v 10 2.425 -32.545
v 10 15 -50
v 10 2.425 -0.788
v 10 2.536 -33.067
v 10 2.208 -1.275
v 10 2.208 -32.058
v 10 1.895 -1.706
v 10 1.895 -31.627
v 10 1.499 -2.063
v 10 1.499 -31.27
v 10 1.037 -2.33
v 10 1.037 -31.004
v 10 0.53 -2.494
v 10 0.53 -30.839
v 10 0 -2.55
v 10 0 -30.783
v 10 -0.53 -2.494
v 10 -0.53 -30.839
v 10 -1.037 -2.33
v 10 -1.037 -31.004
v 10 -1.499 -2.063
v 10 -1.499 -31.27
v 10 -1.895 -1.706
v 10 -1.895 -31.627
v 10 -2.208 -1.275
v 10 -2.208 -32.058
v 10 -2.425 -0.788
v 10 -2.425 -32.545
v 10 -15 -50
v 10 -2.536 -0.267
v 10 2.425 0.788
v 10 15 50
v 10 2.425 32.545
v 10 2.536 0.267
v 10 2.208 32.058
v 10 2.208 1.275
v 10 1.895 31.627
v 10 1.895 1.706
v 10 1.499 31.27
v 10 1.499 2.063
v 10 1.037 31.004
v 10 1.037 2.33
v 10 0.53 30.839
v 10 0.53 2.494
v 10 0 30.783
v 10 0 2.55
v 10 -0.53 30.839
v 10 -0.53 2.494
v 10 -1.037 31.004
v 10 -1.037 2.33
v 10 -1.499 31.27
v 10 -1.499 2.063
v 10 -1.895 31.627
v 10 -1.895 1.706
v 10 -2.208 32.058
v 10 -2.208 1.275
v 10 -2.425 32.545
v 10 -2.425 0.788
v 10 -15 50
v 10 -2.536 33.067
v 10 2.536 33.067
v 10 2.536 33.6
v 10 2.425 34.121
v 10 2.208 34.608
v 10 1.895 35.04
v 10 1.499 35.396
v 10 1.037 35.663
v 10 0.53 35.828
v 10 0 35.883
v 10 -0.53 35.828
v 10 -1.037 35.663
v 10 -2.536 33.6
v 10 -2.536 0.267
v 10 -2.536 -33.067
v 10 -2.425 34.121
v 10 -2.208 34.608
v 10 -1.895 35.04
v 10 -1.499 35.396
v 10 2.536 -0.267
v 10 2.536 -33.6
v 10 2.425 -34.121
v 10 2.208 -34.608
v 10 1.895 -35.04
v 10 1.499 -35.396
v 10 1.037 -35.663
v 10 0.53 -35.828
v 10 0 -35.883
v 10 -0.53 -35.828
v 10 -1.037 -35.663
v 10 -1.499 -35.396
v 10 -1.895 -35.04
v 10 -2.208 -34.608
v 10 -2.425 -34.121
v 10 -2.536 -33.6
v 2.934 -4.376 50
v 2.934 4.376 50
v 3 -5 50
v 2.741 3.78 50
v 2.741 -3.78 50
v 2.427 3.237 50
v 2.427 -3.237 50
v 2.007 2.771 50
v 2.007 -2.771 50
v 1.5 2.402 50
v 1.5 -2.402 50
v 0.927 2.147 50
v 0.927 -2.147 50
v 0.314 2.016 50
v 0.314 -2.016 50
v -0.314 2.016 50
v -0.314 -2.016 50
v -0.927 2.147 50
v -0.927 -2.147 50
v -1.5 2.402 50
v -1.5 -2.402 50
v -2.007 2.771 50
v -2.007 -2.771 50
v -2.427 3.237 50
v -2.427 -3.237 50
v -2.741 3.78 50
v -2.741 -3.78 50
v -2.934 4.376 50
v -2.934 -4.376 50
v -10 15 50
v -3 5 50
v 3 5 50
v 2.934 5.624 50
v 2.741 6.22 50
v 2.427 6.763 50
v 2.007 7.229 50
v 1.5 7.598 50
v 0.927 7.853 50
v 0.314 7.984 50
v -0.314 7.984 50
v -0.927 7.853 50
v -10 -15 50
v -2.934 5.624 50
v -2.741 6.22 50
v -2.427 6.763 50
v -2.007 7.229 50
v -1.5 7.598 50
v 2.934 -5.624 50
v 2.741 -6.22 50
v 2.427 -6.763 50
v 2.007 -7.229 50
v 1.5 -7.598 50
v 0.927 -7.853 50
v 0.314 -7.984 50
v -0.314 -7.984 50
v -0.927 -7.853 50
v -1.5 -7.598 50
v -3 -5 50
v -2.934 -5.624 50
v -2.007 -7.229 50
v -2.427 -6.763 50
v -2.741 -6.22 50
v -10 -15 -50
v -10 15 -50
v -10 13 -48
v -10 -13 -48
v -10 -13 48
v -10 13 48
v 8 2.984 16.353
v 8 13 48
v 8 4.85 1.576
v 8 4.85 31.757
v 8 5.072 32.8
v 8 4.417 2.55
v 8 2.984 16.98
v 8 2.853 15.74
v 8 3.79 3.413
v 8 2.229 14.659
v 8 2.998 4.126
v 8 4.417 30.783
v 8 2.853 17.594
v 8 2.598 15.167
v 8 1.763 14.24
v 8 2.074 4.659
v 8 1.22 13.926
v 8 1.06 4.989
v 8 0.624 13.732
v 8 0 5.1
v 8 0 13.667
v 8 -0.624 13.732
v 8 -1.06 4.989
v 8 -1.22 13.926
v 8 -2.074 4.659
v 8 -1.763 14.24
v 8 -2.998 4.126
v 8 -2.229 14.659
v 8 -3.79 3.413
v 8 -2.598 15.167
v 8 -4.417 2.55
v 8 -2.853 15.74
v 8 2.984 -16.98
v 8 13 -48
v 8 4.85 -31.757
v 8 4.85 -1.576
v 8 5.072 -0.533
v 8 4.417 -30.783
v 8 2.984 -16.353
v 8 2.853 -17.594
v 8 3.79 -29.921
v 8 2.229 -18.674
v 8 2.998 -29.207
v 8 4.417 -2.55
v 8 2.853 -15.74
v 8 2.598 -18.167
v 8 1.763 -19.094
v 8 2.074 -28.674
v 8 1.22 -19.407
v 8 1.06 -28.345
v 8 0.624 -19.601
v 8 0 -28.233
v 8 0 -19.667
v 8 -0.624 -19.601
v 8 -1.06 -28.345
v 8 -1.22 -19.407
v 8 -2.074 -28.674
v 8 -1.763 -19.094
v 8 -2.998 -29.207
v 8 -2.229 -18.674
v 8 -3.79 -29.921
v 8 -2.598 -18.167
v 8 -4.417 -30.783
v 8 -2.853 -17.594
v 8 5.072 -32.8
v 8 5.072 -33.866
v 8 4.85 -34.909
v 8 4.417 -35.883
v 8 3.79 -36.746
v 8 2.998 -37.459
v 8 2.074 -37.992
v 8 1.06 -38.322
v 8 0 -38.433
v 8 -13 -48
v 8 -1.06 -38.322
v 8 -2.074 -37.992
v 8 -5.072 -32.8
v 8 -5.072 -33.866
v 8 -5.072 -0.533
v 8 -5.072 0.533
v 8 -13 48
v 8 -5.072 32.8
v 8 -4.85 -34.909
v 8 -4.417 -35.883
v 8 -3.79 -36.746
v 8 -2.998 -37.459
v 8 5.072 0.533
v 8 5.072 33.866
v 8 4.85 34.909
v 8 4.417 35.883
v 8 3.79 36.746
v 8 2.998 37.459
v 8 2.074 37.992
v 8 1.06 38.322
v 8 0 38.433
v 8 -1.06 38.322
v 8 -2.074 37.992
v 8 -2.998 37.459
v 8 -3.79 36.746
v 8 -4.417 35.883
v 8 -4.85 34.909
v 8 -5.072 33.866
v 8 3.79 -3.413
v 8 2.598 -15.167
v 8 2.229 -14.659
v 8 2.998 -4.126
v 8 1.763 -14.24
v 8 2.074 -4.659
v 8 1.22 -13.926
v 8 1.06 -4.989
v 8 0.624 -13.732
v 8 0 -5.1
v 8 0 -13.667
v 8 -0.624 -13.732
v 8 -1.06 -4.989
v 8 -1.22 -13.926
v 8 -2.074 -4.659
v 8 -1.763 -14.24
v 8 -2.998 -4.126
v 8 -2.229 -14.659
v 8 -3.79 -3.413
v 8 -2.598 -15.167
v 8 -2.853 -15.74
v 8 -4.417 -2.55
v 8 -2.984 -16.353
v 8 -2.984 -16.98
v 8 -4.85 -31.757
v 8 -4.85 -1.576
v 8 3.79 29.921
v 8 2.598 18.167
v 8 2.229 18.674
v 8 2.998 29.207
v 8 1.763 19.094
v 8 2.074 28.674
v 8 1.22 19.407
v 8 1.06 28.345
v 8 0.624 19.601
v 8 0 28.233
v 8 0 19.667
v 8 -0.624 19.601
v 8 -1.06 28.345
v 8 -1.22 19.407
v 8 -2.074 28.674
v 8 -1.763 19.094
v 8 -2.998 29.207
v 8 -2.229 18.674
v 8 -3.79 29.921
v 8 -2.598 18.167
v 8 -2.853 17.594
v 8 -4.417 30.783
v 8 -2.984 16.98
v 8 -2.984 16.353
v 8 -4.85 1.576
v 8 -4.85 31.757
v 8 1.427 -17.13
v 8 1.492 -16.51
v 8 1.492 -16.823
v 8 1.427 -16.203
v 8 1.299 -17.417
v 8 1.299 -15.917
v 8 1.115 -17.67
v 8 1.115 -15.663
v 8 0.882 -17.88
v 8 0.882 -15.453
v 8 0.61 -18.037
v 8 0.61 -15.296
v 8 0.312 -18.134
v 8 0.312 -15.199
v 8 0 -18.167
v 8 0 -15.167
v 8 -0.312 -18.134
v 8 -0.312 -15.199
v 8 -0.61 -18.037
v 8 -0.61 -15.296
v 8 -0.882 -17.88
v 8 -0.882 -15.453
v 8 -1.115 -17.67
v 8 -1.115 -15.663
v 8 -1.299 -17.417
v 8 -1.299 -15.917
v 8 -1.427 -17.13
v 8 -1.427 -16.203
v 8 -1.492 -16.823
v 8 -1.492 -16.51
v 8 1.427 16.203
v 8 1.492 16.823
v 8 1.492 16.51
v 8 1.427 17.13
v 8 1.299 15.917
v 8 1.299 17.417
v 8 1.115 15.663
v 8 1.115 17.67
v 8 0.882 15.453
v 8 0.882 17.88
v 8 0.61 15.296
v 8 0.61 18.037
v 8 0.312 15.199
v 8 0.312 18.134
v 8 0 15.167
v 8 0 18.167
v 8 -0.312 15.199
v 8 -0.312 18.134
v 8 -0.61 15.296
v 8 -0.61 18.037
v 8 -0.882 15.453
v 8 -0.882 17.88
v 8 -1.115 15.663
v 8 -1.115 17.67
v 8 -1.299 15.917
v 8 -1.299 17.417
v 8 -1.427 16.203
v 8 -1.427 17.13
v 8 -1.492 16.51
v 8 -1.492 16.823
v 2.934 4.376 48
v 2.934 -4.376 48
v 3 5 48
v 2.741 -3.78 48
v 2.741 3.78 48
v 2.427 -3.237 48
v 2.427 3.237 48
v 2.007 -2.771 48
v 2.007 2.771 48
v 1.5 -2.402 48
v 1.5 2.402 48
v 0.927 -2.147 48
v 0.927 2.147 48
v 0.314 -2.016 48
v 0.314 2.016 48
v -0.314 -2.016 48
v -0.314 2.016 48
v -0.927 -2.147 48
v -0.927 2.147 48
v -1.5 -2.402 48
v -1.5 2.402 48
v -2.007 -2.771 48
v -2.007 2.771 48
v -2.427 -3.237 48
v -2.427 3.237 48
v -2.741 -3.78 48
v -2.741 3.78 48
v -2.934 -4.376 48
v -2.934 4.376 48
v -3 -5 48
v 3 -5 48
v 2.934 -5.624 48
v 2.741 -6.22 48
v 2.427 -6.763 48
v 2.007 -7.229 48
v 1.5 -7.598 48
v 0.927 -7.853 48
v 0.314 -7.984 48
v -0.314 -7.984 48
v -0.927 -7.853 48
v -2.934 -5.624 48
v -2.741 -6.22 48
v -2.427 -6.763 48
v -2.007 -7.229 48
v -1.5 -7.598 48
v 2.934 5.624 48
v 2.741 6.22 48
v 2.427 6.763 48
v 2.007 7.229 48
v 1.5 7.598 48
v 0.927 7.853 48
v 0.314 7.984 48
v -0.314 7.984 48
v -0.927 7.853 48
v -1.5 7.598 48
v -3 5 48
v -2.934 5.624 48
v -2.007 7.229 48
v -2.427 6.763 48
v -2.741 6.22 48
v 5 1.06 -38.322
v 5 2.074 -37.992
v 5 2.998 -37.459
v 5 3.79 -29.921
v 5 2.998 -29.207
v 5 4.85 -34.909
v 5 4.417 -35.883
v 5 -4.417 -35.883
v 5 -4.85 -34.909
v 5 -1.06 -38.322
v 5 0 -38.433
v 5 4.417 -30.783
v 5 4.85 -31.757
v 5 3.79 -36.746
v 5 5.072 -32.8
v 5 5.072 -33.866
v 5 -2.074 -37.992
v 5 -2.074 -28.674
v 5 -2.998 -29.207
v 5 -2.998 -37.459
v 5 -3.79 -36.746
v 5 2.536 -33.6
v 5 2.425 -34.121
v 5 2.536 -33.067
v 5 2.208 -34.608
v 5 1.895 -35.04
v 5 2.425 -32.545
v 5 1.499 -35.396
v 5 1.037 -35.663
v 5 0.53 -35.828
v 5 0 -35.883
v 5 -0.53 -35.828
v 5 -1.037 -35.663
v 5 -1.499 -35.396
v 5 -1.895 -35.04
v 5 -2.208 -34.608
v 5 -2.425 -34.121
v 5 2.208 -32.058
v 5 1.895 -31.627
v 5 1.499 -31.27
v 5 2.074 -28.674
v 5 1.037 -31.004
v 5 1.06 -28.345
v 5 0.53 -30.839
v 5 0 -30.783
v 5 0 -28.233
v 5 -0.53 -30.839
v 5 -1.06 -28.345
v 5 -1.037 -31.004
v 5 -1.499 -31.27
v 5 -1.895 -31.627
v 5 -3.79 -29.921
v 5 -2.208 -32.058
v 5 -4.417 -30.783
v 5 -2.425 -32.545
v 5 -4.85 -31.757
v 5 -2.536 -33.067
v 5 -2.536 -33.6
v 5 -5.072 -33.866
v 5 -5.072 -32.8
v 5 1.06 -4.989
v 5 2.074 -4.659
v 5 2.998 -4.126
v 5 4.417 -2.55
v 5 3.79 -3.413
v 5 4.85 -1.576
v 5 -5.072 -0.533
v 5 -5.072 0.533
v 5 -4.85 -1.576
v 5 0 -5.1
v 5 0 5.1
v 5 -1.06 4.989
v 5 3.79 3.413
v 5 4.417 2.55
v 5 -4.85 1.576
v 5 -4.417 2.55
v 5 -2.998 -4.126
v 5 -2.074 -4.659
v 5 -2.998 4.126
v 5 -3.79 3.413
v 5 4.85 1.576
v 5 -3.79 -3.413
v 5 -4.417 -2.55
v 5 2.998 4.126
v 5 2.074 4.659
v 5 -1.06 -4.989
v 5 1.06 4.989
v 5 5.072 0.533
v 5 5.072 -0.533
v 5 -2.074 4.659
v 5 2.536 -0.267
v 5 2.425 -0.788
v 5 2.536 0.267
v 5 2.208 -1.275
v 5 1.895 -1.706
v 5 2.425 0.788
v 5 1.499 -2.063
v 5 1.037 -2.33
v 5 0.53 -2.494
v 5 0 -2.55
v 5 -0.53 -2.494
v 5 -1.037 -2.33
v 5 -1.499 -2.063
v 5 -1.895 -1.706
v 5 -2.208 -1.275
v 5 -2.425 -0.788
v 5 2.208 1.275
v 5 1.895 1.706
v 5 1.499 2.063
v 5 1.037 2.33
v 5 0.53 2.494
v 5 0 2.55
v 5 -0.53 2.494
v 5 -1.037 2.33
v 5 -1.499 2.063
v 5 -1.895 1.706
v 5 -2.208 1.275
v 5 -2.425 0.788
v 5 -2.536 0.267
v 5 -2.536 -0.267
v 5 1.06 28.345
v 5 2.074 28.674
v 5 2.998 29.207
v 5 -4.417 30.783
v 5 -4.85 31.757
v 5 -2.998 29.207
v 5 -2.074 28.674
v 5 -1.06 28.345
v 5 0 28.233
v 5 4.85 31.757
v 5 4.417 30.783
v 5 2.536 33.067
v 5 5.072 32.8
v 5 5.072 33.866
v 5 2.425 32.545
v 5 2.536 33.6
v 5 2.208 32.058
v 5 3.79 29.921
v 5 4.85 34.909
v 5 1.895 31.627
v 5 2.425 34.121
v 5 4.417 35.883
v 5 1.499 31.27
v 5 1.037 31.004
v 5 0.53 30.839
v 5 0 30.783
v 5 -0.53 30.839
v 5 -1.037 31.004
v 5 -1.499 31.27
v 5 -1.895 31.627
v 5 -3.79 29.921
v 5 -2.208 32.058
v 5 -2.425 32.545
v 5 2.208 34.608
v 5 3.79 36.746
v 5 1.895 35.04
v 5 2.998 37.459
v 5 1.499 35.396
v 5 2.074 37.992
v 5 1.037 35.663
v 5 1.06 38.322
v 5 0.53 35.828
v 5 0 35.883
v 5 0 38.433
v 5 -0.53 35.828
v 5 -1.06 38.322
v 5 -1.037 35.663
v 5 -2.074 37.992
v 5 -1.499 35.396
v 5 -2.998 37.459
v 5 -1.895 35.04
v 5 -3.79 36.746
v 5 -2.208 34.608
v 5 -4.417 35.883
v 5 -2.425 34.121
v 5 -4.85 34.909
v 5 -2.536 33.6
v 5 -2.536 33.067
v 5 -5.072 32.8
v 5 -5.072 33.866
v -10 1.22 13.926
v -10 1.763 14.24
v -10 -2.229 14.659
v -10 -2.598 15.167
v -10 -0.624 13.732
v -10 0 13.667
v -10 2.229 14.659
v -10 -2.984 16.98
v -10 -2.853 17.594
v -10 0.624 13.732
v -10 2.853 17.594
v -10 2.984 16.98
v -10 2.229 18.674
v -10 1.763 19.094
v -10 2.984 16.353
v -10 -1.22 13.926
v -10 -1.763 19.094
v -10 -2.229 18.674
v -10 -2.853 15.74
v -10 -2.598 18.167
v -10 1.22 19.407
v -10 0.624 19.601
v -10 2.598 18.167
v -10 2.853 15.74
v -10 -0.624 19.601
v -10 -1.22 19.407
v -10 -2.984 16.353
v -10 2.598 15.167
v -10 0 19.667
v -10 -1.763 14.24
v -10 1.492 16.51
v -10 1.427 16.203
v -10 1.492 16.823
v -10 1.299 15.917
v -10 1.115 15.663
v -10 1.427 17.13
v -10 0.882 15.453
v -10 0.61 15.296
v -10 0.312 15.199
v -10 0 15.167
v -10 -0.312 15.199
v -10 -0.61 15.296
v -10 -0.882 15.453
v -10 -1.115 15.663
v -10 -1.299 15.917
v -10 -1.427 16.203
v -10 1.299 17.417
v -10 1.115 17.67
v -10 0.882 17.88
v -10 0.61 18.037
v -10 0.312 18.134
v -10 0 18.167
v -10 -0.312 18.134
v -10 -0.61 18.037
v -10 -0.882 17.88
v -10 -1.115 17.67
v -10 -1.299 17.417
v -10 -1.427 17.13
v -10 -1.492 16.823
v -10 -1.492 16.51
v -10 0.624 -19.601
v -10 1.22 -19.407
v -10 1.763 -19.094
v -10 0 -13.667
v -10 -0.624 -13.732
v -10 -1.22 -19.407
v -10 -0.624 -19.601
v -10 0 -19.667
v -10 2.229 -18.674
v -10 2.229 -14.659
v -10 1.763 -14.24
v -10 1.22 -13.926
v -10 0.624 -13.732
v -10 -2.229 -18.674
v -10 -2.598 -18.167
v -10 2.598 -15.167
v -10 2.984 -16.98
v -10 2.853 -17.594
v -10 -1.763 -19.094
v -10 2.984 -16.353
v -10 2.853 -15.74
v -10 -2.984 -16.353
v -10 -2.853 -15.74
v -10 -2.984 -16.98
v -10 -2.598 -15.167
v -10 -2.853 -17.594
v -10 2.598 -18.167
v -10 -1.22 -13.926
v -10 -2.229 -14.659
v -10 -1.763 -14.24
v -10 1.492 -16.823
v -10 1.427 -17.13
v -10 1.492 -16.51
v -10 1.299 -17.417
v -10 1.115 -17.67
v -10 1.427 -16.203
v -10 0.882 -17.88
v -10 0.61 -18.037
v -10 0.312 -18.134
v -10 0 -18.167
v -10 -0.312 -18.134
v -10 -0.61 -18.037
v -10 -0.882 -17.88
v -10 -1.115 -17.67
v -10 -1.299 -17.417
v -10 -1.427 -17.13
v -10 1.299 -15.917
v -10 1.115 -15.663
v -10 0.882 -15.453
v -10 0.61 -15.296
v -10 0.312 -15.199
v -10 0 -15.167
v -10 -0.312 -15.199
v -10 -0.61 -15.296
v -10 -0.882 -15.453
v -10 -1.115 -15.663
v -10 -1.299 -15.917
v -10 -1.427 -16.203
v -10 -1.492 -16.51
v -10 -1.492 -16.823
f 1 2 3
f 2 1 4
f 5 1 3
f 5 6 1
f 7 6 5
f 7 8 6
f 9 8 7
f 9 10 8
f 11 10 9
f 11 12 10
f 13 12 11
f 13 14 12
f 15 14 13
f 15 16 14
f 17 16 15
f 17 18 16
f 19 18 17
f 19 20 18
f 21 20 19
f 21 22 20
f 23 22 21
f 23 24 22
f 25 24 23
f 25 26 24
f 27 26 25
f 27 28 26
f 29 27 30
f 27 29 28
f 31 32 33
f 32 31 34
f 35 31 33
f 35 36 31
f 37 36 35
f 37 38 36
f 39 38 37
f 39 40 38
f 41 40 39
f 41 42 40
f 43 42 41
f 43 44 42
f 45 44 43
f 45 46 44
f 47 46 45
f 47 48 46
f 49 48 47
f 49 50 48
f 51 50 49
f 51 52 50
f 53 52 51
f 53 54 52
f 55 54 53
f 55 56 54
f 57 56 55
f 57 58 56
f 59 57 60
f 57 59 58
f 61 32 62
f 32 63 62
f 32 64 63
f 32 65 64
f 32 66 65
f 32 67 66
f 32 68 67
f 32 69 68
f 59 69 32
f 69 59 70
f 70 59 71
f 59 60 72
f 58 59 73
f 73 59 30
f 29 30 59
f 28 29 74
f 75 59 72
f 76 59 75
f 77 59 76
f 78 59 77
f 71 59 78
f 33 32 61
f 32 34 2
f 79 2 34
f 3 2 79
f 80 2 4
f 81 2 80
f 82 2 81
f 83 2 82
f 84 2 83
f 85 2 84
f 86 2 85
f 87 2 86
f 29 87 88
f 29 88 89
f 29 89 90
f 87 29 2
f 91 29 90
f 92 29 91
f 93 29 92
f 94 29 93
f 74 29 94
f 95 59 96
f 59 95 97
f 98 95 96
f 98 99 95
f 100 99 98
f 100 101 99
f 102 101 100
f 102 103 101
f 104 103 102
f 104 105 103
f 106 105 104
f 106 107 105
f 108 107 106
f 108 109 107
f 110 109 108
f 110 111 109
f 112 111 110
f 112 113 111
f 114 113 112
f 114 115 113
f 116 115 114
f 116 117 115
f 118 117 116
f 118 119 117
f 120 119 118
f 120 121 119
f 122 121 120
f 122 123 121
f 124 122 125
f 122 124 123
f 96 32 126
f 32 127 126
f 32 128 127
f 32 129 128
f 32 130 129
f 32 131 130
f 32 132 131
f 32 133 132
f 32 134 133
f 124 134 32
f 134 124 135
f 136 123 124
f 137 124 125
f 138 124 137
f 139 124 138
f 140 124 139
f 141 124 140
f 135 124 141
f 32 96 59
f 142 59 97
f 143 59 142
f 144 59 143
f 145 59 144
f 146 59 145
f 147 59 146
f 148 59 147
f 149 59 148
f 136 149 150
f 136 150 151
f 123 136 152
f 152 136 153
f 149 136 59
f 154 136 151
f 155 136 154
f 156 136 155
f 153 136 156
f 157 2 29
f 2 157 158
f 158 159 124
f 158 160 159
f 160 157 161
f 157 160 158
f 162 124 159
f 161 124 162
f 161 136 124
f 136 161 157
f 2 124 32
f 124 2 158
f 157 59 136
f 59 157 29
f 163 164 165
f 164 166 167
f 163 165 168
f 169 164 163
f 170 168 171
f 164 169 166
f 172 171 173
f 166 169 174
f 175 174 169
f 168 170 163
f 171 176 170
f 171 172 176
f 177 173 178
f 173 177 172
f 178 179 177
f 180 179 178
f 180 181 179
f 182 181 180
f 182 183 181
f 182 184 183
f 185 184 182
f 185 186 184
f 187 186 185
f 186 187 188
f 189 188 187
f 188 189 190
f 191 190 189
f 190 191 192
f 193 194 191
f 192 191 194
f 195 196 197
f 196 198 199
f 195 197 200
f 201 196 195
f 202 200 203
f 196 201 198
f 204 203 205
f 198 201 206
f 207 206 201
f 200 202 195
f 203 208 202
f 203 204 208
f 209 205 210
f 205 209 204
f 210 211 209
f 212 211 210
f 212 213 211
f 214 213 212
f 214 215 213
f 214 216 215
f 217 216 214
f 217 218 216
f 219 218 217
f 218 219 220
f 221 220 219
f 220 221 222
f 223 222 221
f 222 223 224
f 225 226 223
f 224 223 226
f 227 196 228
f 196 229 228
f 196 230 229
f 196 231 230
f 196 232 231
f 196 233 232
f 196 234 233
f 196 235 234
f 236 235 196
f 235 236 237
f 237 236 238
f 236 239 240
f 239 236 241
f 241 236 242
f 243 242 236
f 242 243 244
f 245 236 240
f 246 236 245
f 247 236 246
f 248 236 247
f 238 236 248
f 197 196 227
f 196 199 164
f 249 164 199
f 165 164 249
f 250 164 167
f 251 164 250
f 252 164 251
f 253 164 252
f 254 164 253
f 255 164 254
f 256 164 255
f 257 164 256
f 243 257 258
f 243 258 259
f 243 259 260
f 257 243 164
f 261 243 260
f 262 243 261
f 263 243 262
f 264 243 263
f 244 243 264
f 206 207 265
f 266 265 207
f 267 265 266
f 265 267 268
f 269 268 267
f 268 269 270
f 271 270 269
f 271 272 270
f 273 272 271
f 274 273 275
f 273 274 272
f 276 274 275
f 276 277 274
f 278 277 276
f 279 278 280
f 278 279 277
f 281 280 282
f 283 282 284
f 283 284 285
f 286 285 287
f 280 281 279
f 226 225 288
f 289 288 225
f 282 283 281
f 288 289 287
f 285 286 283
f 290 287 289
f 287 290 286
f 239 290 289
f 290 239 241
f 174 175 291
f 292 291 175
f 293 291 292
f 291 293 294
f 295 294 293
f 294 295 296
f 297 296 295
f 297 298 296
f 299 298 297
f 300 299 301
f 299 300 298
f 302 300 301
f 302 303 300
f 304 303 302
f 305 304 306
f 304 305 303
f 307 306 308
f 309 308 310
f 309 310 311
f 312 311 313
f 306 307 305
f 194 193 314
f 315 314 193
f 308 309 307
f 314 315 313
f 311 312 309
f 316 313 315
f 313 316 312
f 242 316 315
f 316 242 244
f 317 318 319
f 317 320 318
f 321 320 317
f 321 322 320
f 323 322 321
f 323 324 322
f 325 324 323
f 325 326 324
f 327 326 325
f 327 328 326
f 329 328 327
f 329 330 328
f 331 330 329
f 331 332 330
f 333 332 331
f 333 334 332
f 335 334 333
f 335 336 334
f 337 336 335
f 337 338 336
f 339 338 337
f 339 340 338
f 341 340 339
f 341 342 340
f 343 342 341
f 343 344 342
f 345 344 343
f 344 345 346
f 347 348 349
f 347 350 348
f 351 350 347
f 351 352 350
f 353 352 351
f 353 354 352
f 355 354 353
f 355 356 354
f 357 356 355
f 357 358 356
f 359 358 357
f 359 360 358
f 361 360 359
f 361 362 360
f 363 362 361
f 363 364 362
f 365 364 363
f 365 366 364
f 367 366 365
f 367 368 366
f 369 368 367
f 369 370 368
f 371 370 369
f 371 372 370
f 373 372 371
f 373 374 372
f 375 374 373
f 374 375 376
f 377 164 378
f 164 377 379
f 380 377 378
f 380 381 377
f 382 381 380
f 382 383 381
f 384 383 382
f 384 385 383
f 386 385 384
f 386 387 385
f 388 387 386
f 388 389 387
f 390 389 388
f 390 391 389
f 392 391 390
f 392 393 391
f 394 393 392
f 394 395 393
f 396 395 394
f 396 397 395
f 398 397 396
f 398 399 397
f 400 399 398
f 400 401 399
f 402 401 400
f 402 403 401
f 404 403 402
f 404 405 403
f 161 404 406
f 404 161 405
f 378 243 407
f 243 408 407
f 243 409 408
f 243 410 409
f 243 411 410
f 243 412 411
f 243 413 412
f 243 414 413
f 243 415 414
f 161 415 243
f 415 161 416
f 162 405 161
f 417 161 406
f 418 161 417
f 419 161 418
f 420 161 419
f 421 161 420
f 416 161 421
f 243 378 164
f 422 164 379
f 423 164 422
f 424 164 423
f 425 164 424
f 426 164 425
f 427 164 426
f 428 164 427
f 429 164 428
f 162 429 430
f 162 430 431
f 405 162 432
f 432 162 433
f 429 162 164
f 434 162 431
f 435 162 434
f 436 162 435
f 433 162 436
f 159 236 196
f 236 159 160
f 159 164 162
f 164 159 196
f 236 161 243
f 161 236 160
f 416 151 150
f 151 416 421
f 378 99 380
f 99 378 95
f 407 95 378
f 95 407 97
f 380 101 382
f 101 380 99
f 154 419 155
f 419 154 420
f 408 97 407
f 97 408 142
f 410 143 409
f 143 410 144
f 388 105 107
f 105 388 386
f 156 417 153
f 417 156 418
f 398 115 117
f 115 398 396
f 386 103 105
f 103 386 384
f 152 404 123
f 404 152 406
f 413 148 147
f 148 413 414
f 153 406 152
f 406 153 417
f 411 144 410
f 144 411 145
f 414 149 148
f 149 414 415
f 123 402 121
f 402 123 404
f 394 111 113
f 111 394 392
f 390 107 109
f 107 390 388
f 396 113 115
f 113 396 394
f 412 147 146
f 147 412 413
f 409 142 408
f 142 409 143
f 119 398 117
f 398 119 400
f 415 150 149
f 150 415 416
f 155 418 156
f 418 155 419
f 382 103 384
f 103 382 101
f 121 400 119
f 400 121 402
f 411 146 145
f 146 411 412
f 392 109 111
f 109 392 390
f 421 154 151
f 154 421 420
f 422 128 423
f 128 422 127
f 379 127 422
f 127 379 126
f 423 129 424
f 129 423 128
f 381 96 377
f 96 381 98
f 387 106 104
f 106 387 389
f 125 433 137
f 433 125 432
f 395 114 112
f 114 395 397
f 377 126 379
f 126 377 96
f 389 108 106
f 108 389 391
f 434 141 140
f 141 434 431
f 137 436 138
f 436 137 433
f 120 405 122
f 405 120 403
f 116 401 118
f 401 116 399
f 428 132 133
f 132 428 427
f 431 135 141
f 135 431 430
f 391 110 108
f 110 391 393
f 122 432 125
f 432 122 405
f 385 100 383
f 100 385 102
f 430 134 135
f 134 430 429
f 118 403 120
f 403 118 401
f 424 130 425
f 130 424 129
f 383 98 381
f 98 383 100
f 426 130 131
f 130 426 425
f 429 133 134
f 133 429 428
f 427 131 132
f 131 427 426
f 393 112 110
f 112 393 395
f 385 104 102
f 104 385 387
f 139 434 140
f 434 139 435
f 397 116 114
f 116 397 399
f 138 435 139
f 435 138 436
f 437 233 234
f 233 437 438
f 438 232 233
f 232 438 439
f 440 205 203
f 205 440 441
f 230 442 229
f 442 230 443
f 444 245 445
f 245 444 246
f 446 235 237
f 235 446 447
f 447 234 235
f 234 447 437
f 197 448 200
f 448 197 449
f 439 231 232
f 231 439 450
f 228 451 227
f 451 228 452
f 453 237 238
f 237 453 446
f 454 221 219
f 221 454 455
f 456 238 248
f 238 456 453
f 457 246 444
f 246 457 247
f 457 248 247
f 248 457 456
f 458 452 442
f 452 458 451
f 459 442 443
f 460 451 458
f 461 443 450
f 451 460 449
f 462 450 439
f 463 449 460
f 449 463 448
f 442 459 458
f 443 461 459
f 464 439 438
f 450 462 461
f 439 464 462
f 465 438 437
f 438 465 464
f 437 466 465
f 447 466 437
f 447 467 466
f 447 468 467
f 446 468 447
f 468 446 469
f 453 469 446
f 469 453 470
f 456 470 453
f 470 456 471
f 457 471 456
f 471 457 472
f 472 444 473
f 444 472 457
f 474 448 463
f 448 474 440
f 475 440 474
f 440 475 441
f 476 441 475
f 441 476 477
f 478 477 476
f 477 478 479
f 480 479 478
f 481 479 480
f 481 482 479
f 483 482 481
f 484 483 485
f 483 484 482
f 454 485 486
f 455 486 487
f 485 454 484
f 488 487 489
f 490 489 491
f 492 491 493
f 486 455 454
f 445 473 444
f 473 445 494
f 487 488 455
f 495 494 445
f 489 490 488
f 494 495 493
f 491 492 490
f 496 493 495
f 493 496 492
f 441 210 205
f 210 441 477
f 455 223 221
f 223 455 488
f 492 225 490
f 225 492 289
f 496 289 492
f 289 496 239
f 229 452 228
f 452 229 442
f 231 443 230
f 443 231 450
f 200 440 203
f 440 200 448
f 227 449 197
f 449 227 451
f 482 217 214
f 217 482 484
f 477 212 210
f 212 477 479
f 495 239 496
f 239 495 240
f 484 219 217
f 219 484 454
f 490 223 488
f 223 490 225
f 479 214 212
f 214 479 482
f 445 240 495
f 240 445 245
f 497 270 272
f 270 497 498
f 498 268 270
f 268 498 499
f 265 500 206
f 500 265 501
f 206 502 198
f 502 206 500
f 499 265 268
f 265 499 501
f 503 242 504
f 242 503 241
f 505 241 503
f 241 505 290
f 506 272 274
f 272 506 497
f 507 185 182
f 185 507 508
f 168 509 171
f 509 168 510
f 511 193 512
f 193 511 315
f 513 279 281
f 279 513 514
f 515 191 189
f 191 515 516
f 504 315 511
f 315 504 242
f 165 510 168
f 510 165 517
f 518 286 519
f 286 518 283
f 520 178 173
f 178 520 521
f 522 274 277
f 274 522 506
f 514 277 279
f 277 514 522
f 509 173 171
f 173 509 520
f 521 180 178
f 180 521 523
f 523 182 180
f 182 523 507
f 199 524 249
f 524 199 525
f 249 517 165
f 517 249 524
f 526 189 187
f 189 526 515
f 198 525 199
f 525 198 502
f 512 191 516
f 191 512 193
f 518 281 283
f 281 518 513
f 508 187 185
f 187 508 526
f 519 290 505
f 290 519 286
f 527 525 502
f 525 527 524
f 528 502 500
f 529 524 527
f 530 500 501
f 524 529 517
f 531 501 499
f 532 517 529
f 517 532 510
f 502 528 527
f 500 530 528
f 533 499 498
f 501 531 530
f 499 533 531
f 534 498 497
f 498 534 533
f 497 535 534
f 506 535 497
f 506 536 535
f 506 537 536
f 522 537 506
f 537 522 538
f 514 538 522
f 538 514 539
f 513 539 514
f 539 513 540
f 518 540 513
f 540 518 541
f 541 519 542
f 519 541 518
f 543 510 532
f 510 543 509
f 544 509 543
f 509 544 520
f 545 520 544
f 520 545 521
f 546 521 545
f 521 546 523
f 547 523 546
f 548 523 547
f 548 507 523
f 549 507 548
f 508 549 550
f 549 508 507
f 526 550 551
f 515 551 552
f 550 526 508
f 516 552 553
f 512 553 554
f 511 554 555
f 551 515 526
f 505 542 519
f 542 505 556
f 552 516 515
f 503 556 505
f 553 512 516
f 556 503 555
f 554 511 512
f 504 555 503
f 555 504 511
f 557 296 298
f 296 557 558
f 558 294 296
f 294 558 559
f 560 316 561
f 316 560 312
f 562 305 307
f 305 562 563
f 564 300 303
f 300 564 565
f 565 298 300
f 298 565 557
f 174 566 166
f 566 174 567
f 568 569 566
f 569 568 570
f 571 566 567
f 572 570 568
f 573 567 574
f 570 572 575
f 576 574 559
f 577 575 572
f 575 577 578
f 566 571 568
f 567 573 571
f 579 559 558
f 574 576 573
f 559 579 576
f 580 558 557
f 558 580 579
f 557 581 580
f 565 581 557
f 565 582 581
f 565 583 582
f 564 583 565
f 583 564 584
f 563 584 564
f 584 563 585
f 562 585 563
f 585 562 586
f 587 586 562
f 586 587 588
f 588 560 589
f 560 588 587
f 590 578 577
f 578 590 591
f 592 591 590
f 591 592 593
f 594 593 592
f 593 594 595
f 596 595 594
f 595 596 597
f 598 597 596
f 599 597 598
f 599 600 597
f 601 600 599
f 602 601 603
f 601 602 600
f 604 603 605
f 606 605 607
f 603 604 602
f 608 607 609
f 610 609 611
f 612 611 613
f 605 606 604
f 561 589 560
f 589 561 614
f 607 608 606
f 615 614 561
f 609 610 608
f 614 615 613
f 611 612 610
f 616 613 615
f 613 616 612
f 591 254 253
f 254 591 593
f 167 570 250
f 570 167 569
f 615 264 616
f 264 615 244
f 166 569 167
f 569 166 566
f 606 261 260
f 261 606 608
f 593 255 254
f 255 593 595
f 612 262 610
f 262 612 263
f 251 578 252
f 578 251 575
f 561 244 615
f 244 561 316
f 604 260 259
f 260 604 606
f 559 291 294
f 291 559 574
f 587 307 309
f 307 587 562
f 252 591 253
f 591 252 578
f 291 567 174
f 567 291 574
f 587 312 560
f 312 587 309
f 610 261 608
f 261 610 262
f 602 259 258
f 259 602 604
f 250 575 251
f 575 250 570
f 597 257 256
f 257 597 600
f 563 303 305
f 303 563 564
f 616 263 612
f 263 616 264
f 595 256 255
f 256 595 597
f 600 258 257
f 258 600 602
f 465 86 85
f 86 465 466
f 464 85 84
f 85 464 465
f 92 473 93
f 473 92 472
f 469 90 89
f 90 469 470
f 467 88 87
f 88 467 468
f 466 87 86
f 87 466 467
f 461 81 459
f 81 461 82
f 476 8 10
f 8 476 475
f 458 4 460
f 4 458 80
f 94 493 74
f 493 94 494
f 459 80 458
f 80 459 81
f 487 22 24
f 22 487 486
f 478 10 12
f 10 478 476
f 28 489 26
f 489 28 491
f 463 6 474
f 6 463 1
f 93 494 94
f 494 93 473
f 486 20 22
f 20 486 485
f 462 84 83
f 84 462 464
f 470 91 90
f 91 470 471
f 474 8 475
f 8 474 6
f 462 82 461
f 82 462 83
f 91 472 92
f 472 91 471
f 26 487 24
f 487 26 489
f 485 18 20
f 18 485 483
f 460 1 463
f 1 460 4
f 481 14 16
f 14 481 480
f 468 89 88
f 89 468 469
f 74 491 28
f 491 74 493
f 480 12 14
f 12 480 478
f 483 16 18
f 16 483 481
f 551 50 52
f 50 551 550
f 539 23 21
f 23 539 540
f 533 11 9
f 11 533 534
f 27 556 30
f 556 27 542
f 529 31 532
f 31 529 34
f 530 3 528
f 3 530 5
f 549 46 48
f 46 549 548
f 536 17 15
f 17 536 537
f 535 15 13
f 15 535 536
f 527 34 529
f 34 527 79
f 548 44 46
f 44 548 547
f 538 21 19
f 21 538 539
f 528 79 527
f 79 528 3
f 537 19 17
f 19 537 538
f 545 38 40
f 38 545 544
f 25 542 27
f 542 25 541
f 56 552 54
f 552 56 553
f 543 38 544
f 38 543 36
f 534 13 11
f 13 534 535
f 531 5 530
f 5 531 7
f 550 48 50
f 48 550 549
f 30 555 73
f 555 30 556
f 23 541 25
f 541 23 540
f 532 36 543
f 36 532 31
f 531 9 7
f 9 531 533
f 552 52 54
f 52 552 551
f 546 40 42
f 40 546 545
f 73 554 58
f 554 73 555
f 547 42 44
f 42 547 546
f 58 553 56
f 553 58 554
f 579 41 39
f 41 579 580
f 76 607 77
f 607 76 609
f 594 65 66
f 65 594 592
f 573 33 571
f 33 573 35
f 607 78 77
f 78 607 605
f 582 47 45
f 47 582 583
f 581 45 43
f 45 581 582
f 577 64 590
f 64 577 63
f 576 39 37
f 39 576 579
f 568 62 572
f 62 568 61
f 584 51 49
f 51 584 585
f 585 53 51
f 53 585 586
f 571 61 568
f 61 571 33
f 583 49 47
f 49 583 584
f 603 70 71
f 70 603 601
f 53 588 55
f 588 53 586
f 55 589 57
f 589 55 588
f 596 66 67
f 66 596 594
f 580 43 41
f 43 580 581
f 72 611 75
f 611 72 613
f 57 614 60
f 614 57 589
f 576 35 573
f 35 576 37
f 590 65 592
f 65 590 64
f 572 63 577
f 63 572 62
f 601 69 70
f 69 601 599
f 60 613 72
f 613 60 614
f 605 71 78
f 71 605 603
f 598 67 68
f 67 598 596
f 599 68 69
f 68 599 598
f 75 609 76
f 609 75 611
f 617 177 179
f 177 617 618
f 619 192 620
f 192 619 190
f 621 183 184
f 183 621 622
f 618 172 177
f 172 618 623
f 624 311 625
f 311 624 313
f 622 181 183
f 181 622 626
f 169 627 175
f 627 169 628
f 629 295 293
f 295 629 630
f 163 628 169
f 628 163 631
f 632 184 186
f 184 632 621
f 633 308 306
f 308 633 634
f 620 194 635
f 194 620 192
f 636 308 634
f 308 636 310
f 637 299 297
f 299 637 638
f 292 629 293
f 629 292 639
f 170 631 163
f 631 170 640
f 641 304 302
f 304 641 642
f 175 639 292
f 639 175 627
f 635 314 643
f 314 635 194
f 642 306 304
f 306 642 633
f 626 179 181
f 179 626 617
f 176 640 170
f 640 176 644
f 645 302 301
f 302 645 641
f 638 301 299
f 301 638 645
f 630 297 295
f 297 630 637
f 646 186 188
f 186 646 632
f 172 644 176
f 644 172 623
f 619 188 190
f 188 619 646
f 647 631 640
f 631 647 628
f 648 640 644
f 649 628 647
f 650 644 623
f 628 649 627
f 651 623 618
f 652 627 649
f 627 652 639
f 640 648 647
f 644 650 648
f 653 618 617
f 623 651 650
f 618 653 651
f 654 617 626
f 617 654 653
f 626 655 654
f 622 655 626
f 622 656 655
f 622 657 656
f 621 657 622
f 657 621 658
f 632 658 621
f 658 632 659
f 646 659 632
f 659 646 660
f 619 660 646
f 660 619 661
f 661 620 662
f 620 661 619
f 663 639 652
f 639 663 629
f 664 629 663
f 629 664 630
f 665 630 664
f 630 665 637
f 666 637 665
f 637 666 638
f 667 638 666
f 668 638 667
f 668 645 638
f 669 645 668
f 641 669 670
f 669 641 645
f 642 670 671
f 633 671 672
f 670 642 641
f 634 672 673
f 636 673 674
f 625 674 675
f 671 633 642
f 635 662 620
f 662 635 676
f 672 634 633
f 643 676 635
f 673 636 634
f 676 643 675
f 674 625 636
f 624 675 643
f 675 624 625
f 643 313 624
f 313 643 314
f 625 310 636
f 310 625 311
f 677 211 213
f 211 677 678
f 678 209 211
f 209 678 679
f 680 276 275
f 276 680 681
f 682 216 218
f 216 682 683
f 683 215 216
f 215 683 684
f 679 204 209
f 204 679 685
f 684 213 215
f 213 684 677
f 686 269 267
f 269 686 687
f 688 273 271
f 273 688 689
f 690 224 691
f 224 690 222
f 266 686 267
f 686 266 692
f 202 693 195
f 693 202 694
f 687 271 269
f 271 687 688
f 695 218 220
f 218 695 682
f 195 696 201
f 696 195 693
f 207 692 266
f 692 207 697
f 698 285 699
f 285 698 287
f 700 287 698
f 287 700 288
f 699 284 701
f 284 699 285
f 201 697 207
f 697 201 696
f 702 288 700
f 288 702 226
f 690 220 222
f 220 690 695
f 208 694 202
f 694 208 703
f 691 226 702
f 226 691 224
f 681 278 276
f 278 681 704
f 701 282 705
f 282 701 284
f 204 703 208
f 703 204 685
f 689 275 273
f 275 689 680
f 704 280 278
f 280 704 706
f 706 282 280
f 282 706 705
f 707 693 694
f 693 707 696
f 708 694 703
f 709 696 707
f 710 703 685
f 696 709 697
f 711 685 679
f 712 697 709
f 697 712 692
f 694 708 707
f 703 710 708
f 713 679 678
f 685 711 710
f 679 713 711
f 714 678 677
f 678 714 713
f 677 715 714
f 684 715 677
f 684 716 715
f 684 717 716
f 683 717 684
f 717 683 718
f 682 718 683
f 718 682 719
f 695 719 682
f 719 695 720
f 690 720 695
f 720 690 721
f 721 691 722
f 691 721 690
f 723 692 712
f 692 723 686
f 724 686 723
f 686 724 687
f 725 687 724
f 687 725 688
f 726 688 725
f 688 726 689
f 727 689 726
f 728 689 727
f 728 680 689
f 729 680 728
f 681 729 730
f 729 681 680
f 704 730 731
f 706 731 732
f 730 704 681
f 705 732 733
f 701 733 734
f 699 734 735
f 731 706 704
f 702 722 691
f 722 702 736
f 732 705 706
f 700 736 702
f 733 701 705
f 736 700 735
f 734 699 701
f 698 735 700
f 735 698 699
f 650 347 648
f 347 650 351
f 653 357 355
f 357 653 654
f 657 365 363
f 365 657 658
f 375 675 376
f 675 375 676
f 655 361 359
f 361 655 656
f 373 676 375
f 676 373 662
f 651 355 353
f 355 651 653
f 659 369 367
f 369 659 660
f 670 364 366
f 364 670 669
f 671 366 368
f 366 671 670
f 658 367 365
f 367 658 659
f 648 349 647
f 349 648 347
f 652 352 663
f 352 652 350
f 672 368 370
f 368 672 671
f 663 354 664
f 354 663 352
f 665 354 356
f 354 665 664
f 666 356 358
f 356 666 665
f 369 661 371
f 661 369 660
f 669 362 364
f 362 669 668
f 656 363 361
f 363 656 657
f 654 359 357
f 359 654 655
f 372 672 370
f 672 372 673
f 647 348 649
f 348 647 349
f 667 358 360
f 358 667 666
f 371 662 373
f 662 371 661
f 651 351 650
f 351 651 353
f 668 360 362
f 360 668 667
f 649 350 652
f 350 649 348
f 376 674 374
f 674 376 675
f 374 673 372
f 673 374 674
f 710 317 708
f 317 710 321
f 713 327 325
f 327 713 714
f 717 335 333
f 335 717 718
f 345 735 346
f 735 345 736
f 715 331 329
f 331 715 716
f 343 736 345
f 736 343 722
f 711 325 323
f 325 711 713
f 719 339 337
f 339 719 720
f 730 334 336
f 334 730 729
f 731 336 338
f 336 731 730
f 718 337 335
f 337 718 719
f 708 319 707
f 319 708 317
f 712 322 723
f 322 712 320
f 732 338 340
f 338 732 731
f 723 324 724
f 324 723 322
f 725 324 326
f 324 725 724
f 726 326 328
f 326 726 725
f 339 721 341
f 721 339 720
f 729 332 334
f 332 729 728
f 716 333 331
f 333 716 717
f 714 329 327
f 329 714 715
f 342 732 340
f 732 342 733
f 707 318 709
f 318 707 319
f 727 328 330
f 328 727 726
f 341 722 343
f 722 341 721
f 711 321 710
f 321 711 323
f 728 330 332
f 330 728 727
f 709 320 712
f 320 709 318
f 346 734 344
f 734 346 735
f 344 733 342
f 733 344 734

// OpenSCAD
// Lichtschranke

Lichtschranke = true;
if (Lichtschranke) Lichtschranke();
Gewinde = true;
if (Gewinde) Gewinde();
    
led = 5.1;

h = 100;
b = 30;
t = 20;
w = 2;
    
module Lichtschranke() {
    $fn =30;
    
    difference() {
        union() {
            difference() {
                cube ([t,b,h], center=true);
                
                translate([-w,0,0])
                cube ([t,b-2*w,h-2*w], center=true);
                
                
                translate([0,-b/6,5])
                cylinder(r=3,h=h,center=true);
            
                translate([0,b/6,5])
                cylinder(r=3,h=h,center=true);

            }
            rotate([0,90,0])
            translate([h/3,0,t/2-5])
            cylinder(d=2*led,h=5,center=false);
            
            rotate([0,90,0])
            translate([0,0,t/2-5])
            cylinder(d=2*led,h=5,center=false);

            rotate([0,90,0])
            translate([-h/3,0,t/2-5])
            cylinder(d=2*led,h=5,center=false);
        
        }

        rotate([0,90,0])
        translate([h/3,0,0])
        cylinder(d=led,h=50,center=true);
        
        rotate([0,90,0])
        translate([0,0,0])
        cylinder(d=led,h=50,center=true);
    
        rotate([0,90,0])
        translate([-h/3,0,0])
        cylinder(d=led,h=50,center=true);
    
    }
  
}


module Gewinde() {
    $fn =30;
    difference() {
        union() {
            rotate([0,90,0])
            translate([-h/6,0,0])
            cylinder(d=6,h=t,center=true);
    
            rotate([0,90,0])
            translate([h/6,0,0])
            cylinder(d=6,h=t,center=true);
        }
        rotate([0,90,0])
        translate([-h/6,0,t/2-5])
        cylinder(d=3,h=58,center=true);

        rotate([0,90,0])
        translate([h/6,0,t/2-5])
        cylinder(d=3,h=58,center=true);
       
    }
}
